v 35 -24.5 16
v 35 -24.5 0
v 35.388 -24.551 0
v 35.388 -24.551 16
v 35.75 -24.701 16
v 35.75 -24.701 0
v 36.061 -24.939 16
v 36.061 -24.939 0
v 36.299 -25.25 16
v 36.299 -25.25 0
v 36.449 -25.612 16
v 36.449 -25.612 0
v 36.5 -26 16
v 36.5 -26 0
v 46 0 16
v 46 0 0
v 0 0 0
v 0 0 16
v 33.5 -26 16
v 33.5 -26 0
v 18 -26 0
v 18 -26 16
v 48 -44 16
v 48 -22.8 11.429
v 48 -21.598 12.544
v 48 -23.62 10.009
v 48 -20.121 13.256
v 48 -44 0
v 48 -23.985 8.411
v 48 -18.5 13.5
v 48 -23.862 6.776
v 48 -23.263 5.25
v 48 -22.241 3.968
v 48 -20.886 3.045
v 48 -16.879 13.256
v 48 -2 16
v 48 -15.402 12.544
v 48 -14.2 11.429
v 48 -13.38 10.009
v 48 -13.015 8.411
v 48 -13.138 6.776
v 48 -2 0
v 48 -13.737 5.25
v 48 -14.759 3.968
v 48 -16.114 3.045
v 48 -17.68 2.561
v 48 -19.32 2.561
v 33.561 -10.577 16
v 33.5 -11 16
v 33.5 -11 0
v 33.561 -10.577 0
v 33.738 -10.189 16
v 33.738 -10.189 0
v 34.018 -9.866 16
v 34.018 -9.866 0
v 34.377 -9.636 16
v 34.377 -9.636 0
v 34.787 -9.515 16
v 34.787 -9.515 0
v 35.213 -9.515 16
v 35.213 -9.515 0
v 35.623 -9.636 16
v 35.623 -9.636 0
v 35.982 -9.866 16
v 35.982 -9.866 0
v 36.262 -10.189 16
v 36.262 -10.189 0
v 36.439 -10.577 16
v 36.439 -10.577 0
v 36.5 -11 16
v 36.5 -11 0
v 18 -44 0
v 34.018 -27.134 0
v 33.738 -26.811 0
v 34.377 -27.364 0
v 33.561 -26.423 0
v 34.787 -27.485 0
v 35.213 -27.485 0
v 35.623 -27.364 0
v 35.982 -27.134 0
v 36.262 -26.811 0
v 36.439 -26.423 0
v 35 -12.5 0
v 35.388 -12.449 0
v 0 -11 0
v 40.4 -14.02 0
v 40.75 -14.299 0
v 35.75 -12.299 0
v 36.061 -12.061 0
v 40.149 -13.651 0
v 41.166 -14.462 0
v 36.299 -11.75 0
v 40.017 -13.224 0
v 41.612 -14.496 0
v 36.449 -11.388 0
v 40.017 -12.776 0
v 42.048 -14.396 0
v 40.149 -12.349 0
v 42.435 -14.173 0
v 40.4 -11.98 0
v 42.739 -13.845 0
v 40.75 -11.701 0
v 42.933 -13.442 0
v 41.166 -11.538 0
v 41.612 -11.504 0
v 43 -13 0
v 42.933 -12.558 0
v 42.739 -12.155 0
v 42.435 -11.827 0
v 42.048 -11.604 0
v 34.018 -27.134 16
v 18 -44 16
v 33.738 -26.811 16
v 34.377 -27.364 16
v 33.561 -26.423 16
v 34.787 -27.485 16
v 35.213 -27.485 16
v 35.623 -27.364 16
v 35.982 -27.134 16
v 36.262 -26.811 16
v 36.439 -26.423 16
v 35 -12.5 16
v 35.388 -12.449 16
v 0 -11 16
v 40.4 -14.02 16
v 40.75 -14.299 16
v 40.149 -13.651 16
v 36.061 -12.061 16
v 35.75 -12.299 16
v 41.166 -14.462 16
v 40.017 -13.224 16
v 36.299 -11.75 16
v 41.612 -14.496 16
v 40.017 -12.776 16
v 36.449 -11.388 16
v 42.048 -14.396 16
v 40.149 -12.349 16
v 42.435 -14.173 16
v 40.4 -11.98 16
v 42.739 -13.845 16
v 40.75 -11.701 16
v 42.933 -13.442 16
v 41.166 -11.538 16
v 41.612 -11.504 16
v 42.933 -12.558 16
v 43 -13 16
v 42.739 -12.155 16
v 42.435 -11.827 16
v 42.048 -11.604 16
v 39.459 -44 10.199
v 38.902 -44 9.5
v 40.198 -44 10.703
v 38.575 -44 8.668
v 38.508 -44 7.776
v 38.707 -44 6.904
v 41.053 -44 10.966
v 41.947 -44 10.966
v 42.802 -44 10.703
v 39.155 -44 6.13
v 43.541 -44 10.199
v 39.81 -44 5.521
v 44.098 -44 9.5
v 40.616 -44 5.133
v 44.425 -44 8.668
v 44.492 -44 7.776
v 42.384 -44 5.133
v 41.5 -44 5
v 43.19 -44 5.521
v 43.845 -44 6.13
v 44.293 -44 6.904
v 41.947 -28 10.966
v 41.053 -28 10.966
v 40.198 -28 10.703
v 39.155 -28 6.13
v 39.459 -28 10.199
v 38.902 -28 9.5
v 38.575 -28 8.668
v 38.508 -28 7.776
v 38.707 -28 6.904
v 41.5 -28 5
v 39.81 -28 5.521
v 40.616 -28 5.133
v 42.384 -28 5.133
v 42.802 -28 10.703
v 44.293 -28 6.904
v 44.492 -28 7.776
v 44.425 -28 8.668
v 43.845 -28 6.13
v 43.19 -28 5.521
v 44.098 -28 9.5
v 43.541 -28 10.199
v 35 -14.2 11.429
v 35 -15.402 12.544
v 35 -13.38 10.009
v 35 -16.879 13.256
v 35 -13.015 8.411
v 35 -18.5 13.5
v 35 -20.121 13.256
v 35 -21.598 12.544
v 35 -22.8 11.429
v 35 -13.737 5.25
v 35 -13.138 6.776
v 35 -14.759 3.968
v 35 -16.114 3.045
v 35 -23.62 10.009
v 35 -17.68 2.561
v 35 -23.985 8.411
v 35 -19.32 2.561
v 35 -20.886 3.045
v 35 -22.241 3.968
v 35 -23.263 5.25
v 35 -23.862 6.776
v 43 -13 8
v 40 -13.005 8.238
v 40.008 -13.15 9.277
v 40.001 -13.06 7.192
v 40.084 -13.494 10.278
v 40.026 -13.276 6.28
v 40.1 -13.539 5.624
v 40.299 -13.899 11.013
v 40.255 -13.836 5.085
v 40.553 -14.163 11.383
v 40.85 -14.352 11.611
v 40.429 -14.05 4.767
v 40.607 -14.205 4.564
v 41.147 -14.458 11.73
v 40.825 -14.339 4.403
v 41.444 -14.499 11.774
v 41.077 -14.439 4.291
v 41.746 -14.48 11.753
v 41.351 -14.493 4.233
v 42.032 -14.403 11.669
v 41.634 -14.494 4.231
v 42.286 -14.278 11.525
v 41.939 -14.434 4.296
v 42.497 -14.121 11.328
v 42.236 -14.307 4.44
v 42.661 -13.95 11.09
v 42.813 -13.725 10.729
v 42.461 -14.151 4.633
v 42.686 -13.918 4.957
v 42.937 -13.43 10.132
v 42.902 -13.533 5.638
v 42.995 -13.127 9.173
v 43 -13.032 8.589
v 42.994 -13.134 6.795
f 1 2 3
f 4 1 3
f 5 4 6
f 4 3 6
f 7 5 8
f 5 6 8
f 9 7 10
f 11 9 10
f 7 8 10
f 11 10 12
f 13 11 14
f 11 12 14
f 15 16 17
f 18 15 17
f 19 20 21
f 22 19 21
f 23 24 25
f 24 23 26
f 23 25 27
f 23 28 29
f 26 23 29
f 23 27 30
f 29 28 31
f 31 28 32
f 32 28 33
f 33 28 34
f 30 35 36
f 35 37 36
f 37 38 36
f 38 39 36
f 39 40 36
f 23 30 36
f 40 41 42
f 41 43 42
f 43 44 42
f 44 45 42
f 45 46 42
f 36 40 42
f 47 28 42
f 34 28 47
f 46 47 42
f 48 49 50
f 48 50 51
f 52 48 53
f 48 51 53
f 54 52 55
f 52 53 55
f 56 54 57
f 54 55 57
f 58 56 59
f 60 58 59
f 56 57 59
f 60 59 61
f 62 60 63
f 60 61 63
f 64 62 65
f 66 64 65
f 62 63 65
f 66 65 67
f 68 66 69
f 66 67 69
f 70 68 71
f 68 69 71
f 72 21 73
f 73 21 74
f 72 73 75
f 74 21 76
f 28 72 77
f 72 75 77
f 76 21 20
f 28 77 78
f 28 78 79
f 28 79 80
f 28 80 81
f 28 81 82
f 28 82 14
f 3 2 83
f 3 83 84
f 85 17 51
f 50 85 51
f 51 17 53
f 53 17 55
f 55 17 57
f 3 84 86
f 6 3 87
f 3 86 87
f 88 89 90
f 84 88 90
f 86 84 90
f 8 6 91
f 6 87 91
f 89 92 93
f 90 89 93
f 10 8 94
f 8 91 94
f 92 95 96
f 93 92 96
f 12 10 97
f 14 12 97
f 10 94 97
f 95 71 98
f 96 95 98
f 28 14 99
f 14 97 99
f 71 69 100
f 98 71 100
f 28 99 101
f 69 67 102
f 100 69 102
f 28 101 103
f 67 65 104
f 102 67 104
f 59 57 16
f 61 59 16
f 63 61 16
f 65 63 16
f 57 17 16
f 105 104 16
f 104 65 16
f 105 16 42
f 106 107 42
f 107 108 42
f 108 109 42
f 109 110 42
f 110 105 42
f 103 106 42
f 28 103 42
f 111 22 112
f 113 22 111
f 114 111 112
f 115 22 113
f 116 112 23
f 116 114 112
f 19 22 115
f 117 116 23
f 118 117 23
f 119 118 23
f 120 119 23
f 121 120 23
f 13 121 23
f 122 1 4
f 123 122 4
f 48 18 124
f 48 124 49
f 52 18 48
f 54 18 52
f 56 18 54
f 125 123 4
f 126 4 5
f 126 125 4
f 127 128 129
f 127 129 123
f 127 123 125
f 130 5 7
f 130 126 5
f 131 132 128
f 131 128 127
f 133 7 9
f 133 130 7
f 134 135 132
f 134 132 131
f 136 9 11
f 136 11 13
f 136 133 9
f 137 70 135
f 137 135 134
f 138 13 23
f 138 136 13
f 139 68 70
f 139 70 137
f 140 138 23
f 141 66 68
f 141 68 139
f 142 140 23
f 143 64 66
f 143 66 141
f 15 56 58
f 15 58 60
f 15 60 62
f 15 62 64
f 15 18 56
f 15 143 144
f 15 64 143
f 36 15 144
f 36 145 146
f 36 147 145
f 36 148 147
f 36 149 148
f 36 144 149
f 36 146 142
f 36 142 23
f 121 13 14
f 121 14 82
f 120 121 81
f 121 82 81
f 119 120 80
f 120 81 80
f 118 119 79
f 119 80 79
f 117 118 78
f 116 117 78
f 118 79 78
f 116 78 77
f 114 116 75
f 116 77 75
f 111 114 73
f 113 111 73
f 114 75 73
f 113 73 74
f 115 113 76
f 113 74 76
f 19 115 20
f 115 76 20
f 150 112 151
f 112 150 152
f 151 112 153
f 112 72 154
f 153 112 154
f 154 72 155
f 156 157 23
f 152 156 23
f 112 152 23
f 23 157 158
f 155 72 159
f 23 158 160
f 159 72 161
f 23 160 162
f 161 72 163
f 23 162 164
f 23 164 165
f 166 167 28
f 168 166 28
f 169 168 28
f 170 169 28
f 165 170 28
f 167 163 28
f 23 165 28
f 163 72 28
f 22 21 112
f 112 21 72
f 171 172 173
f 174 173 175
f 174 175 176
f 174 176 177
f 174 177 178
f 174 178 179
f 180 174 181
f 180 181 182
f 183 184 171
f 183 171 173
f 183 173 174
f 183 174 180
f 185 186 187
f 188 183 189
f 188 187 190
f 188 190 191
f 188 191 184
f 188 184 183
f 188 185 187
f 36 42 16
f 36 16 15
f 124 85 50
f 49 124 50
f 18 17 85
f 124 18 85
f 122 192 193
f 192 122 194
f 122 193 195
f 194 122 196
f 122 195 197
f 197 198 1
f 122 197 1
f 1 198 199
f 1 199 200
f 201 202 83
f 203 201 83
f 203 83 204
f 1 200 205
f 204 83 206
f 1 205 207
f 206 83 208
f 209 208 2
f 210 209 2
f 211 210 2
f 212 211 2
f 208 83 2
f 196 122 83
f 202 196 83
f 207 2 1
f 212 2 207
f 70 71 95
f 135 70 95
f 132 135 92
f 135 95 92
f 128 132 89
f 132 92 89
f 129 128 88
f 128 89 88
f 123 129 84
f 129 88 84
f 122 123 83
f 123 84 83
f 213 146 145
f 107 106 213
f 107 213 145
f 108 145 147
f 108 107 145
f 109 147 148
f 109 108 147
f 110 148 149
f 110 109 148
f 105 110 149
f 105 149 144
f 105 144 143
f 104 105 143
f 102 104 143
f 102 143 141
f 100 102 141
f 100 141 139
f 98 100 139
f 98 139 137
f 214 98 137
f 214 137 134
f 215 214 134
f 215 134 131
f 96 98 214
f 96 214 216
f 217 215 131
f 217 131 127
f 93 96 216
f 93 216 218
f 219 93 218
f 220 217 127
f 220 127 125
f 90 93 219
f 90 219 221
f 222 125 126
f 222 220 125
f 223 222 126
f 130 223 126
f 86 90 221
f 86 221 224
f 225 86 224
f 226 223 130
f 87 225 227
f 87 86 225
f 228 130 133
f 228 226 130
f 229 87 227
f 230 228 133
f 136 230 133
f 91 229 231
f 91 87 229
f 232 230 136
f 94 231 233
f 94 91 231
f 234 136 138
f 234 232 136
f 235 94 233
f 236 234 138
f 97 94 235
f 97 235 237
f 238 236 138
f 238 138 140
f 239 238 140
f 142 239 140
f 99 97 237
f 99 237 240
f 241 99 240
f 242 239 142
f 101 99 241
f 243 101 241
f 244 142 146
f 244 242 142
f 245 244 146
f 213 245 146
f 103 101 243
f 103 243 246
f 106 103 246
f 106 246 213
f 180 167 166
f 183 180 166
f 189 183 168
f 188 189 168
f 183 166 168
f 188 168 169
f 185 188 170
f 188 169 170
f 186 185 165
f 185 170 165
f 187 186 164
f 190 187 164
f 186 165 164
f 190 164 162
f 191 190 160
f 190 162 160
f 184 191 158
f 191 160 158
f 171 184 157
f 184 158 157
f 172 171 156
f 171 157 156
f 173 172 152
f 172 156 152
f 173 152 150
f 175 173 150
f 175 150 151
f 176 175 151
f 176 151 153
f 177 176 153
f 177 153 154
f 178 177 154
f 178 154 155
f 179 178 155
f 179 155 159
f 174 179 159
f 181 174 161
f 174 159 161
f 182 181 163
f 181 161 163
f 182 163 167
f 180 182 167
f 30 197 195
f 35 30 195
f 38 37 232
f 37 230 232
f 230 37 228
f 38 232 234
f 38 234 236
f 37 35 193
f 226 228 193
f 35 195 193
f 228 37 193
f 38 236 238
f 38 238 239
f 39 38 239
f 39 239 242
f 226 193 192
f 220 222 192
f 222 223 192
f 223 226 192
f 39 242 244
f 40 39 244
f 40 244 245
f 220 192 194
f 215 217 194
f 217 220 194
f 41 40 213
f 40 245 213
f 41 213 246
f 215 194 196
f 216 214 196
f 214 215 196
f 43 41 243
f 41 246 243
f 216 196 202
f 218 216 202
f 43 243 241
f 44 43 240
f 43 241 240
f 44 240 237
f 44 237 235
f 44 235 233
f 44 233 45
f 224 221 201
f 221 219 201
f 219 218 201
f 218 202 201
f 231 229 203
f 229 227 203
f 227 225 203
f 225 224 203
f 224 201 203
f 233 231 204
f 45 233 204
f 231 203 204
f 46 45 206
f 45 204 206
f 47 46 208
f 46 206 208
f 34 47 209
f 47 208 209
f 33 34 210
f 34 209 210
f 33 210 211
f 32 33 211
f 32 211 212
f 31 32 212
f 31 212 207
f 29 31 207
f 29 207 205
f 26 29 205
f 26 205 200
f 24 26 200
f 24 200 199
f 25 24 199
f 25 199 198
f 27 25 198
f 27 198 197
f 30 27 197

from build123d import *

# Parameters (mm, degrees)
ESBO_O1_R                = 1.5
RESSALTO_EXTRUS_O1_DEPTH = 16
CHANFRO1_SIZE            = 2
ESBO_O2_R                = 5.5
CORTE_EXTRUS_O1_DEPTH    = 59.455110983
ESBO_O5_R                = 3
CORTE_EXTRUS_O2_DEPTH    = 16


with BuildPart() as part:
    # Esboço1 → Ressalto-extrusão1 (new body)
    with BuildSketch(Plane.XY):
        with BuildLine():
            Line((48, 0), (0, 0))
            Line((0, 0), (0, -11))
            Line((0, -11), (33.5, -11))
            ThreePointArc((33.5, -11), (35, -9.5), (36.5, -11))
            ThreePointArc((36.5, -11), (36.060660172, -12.060660172), (35, -12.5))
            Line((35, -12.5), (35, -24.5))
            ThreePointArc((35, -24.5), (36.060660172, -24.939339828), (36.5, -26))
            ThreePointArc((36.5, -26), (35, -27.5), (33.5, -26))
            Line((33.5, -26), (18, -26))
            Line((18, -26), (18, -44))
            Line((18, -44), (48, -44))
            Line((48, -44), (48, 0))
        make_face()
        with Locations((41.5, -13)):
            Circle(ESBO_O1_R, mode=Mode.SUBTRACT)
    extrude(amount=RESSALTO_EXTRUS_O1_DEPTH)

    # Chanfro1
    chanfro1_edges = [part.edges().sort_by_distance(p)[0] for p in [
        (48, 0, 8),
    ]]
    chamfer(chanfro1_edges, length=CHANFRO1_SIZE)

    # Esboço2 → Corte-extrusão1 (cut, through all)
    with BuildSketch(Plane.ZY.offset(-35)):
        with Locations((8, -18.5)):
            Circle(ESBO_O2_R)
    extrude(amount=-CORTE_EXTRUS_O1_DEPTH, mode=Mode.SUBTRACT)

    # Esboço5 → Corte-extrusão2 (cut)
    with BuildSketch(Plane.XZ.offset(44)):
        with Locations(Location((41.5, 8, 0), (0, 0, 270))):
            Circle(ESBO_O5_R)
    extrude(amount=-CORTE_EXTRUS_O2_DEPTH, mode=Mode.SUBTRACT)


solid = part.part
